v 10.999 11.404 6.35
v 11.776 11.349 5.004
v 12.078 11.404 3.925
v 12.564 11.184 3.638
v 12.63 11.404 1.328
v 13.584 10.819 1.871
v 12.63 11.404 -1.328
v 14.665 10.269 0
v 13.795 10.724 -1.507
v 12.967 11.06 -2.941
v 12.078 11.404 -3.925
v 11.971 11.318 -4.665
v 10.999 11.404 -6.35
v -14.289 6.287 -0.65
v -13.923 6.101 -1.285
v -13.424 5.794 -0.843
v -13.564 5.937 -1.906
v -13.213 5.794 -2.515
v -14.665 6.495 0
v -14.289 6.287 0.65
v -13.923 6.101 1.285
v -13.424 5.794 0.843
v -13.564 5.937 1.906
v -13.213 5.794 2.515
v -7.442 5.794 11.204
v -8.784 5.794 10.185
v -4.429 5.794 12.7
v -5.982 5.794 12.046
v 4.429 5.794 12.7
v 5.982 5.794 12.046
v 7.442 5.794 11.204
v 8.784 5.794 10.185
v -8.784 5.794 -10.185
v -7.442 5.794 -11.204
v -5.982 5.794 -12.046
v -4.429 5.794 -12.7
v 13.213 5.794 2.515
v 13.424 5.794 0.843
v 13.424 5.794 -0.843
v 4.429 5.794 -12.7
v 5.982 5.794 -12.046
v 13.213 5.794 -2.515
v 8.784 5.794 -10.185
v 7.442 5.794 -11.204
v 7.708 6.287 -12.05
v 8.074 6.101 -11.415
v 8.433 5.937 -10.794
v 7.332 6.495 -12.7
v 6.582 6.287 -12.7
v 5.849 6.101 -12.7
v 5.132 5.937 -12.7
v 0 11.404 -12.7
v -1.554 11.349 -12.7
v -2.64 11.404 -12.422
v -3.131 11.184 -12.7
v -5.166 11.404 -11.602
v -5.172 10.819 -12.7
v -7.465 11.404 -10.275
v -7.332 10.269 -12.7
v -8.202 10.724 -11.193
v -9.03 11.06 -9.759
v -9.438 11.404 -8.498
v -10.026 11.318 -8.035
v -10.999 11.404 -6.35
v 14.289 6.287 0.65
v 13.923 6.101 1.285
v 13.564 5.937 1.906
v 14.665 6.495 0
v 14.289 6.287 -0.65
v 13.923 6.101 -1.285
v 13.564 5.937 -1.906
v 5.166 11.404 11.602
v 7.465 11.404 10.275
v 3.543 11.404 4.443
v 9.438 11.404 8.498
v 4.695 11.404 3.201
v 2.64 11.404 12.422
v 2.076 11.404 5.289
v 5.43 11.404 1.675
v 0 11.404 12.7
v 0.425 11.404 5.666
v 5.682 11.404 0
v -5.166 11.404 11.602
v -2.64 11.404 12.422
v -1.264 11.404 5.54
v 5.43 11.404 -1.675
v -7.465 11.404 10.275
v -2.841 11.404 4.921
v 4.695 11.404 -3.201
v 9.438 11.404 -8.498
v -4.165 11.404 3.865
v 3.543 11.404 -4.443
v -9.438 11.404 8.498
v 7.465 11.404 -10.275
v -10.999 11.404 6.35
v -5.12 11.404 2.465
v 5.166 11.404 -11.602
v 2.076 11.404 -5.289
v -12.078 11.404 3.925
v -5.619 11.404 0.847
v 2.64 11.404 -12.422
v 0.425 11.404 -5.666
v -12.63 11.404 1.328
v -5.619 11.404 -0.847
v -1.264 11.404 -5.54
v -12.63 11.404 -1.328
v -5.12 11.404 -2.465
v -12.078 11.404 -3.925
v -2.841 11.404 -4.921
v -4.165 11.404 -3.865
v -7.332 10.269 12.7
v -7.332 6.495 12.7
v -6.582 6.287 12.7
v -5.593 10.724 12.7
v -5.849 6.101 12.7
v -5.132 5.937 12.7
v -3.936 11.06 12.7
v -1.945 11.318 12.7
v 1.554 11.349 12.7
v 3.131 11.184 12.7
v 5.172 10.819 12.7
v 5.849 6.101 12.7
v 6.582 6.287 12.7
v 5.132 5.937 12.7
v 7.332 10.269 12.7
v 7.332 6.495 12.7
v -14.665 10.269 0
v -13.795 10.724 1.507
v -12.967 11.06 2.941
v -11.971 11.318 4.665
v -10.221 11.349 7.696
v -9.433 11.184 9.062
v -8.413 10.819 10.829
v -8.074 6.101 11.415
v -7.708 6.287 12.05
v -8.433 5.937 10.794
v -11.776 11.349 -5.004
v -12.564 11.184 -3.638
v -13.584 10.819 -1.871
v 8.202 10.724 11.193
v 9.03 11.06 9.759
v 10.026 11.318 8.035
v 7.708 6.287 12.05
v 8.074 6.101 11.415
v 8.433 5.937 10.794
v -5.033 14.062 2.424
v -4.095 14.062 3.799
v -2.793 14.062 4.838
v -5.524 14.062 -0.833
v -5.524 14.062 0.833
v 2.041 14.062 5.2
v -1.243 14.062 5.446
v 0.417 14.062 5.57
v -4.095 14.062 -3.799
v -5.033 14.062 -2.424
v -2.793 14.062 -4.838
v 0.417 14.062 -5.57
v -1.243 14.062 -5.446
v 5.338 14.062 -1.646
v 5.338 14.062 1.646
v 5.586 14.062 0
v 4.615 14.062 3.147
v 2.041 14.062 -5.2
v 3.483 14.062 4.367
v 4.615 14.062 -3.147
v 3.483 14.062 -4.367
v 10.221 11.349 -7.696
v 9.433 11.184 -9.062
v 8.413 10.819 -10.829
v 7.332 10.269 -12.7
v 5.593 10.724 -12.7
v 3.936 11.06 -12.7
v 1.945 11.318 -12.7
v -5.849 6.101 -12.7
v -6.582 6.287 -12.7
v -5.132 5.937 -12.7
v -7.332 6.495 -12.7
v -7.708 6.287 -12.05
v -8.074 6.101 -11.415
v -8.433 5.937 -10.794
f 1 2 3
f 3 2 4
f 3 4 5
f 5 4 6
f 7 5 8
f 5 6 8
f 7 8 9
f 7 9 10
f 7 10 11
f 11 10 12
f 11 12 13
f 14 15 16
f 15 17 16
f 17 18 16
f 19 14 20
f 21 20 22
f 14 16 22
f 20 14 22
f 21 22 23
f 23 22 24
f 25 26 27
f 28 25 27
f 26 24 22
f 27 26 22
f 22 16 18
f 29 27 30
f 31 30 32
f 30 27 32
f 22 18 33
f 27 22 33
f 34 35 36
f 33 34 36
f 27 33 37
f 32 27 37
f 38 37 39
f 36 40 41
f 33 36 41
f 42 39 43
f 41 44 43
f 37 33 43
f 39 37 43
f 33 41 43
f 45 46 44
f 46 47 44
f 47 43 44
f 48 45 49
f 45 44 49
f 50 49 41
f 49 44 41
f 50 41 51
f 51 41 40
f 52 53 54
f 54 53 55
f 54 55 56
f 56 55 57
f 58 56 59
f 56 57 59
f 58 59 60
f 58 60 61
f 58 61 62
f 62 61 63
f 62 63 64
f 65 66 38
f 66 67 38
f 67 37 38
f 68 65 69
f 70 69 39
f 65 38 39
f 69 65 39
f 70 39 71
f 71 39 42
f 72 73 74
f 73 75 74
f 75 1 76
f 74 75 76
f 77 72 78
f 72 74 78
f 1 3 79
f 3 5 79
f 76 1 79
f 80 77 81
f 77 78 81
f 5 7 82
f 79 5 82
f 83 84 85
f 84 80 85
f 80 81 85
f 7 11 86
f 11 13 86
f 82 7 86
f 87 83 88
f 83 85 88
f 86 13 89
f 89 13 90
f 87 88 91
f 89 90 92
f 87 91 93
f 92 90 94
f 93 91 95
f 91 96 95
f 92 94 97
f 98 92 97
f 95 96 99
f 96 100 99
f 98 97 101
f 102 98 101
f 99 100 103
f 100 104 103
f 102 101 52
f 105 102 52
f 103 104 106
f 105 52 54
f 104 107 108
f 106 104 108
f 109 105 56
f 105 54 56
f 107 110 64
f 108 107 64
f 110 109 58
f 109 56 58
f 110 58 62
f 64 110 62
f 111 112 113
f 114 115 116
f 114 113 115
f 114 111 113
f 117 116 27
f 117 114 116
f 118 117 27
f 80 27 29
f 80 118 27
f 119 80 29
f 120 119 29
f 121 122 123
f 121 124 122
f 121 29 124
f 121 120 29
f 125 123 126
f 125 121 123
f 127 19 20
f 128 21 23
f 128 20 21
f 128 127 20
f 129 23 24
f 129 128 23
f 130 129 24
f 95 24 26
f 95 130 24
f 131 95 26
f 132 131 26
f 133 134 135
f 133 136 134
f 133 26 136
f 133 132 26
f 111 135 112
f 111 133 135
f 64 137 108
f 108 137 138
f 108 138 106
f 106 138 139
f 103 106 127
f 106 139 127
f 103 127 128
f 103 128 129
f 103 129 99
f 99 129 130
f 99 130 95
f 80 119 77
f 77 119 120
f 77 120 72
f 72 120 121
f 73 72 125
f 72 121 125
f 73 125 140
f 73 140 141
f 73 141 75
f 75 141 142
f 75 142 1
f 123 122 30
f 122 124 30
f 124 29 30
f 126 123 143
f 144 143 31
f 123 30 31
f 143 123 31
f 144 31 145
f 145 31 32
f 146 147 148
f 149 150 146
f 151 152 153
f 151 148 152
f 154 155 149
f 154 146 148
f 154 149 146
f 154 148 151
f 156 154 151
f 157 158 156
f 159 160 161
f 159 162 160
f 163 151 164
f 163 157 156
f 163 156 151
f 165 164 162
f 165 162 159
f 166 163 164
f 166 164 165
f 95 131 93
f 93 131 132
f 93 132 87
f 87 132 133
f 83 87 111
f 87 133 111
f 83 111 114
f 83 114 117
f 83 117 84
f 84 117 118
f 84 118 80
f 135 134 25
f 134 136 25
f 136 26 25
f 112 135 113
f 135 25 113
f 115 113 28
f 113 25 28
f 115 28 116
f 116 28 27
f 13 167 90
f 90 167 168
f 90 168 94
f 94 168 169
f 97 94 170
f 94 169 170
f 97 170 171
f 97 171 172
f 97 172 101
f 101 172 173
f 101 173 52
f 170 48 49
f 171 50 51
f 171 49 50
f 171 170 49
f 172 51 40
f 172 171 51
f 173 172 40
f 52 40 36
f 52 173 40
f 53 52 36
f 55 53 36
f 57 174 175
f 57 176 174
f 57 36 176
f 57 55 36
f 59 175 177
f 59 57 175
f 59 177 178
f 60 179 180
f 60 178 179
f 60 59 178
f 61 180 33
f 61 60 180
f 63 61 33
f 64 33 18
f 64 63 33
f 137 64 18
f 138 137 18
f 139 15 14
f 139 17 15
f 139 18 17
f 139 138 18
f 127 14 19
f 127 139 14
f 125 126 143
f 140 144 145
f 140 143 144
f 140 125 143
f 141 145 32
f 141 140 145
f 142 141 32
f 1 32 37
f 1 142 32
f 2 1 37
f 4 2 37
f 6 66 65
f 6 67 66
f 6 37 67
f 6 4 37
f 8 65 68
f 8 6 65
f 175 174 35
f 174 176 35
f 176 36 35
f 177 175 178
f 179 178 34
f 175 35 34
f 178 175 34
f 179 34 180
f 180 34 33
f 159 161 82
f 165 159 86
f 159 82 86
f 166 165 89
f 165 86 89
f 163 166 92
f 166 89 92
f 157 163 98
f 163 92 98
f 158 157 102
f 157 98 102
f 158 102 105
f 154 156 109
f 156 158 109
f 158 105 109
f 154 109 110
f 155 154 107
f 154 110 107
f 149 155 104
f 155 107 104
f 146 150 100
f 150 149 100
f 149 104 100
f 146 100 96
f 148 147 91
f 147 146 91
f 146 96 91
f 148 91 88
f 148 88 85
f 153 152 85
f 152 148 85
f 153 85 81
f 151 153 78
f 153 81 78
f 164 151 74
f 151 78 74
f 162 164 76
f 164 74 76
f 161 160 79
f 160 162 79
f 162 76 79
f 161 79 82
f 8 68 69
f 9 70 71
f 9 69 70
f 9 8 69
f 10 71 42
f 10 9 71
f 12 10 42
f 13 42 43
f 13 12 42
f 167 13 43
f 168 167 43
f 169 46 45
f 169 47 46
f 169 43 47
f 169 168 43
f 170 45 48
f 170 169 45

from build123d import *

# Parameters (mm, degrees)
SKETCH2_W          = 47.16496854
SKETCH2_H          = 39.085316542
CUT_EXTRUDE1_DEPTH = 5.61
SKETCH3_W          = 40
SKETCH3_H          = 40
CUT_EXTRUDE2_DEPTH = 50


with BuildPart() as part:
    # Sketch1 → Revolve1 (revolve)
    with BuildSketch(Plane.XY):
        Polygon((0, 34.0386), (5.5795, 34.0386), (5.5795, 14.2396), (5.682246885, 11.4036), (12.7, 11.4036), (17.933402515, 8.382093649), (13.45, 5.7936), (0, 5.7936), align=None)
    revolve(axis=Axis((0, 5.7936, 0), (0, 1, 0)))

    # Sketch2 → Cut-Extrude1 (cut)
    with BuildSketch(Plane(origin=(0, 11.4036, 0), x_dir=(1, 0, 0), z_dir=(0, 1, 0))):
        with Locations((0.151493475, -0.8079652)):
            Rectangle(SKETCH2_W, SKETCH2_H)
        Polygon((14.664696837, 0), (7.332348419, 12.7), (-7.332348419, 12.7), (-14.664696837, 0), (-7.332348419, -12.7), (7.332348419, -12.7), align=None, mode=Mode.SUBTRACT)
    extrude(amount=-CUT_EXTRUDE1_DEPTH, mode=Mode.SUBTRACT)

    # Sketch3 → Cut-Extrude2 (cut)
    with BuildSketch(Plane(origin=(0, 14.0616, 0), x_dir=(1, 0, 0), z_dir=(0, 1, 0))):
        Rectangle(SKETCH3_W, SKETCH3_H)
    extrude(amount=CUT_EXTRUDE2_DEPTH, mode=Mode.SUBTRACT)


solid = part.part
